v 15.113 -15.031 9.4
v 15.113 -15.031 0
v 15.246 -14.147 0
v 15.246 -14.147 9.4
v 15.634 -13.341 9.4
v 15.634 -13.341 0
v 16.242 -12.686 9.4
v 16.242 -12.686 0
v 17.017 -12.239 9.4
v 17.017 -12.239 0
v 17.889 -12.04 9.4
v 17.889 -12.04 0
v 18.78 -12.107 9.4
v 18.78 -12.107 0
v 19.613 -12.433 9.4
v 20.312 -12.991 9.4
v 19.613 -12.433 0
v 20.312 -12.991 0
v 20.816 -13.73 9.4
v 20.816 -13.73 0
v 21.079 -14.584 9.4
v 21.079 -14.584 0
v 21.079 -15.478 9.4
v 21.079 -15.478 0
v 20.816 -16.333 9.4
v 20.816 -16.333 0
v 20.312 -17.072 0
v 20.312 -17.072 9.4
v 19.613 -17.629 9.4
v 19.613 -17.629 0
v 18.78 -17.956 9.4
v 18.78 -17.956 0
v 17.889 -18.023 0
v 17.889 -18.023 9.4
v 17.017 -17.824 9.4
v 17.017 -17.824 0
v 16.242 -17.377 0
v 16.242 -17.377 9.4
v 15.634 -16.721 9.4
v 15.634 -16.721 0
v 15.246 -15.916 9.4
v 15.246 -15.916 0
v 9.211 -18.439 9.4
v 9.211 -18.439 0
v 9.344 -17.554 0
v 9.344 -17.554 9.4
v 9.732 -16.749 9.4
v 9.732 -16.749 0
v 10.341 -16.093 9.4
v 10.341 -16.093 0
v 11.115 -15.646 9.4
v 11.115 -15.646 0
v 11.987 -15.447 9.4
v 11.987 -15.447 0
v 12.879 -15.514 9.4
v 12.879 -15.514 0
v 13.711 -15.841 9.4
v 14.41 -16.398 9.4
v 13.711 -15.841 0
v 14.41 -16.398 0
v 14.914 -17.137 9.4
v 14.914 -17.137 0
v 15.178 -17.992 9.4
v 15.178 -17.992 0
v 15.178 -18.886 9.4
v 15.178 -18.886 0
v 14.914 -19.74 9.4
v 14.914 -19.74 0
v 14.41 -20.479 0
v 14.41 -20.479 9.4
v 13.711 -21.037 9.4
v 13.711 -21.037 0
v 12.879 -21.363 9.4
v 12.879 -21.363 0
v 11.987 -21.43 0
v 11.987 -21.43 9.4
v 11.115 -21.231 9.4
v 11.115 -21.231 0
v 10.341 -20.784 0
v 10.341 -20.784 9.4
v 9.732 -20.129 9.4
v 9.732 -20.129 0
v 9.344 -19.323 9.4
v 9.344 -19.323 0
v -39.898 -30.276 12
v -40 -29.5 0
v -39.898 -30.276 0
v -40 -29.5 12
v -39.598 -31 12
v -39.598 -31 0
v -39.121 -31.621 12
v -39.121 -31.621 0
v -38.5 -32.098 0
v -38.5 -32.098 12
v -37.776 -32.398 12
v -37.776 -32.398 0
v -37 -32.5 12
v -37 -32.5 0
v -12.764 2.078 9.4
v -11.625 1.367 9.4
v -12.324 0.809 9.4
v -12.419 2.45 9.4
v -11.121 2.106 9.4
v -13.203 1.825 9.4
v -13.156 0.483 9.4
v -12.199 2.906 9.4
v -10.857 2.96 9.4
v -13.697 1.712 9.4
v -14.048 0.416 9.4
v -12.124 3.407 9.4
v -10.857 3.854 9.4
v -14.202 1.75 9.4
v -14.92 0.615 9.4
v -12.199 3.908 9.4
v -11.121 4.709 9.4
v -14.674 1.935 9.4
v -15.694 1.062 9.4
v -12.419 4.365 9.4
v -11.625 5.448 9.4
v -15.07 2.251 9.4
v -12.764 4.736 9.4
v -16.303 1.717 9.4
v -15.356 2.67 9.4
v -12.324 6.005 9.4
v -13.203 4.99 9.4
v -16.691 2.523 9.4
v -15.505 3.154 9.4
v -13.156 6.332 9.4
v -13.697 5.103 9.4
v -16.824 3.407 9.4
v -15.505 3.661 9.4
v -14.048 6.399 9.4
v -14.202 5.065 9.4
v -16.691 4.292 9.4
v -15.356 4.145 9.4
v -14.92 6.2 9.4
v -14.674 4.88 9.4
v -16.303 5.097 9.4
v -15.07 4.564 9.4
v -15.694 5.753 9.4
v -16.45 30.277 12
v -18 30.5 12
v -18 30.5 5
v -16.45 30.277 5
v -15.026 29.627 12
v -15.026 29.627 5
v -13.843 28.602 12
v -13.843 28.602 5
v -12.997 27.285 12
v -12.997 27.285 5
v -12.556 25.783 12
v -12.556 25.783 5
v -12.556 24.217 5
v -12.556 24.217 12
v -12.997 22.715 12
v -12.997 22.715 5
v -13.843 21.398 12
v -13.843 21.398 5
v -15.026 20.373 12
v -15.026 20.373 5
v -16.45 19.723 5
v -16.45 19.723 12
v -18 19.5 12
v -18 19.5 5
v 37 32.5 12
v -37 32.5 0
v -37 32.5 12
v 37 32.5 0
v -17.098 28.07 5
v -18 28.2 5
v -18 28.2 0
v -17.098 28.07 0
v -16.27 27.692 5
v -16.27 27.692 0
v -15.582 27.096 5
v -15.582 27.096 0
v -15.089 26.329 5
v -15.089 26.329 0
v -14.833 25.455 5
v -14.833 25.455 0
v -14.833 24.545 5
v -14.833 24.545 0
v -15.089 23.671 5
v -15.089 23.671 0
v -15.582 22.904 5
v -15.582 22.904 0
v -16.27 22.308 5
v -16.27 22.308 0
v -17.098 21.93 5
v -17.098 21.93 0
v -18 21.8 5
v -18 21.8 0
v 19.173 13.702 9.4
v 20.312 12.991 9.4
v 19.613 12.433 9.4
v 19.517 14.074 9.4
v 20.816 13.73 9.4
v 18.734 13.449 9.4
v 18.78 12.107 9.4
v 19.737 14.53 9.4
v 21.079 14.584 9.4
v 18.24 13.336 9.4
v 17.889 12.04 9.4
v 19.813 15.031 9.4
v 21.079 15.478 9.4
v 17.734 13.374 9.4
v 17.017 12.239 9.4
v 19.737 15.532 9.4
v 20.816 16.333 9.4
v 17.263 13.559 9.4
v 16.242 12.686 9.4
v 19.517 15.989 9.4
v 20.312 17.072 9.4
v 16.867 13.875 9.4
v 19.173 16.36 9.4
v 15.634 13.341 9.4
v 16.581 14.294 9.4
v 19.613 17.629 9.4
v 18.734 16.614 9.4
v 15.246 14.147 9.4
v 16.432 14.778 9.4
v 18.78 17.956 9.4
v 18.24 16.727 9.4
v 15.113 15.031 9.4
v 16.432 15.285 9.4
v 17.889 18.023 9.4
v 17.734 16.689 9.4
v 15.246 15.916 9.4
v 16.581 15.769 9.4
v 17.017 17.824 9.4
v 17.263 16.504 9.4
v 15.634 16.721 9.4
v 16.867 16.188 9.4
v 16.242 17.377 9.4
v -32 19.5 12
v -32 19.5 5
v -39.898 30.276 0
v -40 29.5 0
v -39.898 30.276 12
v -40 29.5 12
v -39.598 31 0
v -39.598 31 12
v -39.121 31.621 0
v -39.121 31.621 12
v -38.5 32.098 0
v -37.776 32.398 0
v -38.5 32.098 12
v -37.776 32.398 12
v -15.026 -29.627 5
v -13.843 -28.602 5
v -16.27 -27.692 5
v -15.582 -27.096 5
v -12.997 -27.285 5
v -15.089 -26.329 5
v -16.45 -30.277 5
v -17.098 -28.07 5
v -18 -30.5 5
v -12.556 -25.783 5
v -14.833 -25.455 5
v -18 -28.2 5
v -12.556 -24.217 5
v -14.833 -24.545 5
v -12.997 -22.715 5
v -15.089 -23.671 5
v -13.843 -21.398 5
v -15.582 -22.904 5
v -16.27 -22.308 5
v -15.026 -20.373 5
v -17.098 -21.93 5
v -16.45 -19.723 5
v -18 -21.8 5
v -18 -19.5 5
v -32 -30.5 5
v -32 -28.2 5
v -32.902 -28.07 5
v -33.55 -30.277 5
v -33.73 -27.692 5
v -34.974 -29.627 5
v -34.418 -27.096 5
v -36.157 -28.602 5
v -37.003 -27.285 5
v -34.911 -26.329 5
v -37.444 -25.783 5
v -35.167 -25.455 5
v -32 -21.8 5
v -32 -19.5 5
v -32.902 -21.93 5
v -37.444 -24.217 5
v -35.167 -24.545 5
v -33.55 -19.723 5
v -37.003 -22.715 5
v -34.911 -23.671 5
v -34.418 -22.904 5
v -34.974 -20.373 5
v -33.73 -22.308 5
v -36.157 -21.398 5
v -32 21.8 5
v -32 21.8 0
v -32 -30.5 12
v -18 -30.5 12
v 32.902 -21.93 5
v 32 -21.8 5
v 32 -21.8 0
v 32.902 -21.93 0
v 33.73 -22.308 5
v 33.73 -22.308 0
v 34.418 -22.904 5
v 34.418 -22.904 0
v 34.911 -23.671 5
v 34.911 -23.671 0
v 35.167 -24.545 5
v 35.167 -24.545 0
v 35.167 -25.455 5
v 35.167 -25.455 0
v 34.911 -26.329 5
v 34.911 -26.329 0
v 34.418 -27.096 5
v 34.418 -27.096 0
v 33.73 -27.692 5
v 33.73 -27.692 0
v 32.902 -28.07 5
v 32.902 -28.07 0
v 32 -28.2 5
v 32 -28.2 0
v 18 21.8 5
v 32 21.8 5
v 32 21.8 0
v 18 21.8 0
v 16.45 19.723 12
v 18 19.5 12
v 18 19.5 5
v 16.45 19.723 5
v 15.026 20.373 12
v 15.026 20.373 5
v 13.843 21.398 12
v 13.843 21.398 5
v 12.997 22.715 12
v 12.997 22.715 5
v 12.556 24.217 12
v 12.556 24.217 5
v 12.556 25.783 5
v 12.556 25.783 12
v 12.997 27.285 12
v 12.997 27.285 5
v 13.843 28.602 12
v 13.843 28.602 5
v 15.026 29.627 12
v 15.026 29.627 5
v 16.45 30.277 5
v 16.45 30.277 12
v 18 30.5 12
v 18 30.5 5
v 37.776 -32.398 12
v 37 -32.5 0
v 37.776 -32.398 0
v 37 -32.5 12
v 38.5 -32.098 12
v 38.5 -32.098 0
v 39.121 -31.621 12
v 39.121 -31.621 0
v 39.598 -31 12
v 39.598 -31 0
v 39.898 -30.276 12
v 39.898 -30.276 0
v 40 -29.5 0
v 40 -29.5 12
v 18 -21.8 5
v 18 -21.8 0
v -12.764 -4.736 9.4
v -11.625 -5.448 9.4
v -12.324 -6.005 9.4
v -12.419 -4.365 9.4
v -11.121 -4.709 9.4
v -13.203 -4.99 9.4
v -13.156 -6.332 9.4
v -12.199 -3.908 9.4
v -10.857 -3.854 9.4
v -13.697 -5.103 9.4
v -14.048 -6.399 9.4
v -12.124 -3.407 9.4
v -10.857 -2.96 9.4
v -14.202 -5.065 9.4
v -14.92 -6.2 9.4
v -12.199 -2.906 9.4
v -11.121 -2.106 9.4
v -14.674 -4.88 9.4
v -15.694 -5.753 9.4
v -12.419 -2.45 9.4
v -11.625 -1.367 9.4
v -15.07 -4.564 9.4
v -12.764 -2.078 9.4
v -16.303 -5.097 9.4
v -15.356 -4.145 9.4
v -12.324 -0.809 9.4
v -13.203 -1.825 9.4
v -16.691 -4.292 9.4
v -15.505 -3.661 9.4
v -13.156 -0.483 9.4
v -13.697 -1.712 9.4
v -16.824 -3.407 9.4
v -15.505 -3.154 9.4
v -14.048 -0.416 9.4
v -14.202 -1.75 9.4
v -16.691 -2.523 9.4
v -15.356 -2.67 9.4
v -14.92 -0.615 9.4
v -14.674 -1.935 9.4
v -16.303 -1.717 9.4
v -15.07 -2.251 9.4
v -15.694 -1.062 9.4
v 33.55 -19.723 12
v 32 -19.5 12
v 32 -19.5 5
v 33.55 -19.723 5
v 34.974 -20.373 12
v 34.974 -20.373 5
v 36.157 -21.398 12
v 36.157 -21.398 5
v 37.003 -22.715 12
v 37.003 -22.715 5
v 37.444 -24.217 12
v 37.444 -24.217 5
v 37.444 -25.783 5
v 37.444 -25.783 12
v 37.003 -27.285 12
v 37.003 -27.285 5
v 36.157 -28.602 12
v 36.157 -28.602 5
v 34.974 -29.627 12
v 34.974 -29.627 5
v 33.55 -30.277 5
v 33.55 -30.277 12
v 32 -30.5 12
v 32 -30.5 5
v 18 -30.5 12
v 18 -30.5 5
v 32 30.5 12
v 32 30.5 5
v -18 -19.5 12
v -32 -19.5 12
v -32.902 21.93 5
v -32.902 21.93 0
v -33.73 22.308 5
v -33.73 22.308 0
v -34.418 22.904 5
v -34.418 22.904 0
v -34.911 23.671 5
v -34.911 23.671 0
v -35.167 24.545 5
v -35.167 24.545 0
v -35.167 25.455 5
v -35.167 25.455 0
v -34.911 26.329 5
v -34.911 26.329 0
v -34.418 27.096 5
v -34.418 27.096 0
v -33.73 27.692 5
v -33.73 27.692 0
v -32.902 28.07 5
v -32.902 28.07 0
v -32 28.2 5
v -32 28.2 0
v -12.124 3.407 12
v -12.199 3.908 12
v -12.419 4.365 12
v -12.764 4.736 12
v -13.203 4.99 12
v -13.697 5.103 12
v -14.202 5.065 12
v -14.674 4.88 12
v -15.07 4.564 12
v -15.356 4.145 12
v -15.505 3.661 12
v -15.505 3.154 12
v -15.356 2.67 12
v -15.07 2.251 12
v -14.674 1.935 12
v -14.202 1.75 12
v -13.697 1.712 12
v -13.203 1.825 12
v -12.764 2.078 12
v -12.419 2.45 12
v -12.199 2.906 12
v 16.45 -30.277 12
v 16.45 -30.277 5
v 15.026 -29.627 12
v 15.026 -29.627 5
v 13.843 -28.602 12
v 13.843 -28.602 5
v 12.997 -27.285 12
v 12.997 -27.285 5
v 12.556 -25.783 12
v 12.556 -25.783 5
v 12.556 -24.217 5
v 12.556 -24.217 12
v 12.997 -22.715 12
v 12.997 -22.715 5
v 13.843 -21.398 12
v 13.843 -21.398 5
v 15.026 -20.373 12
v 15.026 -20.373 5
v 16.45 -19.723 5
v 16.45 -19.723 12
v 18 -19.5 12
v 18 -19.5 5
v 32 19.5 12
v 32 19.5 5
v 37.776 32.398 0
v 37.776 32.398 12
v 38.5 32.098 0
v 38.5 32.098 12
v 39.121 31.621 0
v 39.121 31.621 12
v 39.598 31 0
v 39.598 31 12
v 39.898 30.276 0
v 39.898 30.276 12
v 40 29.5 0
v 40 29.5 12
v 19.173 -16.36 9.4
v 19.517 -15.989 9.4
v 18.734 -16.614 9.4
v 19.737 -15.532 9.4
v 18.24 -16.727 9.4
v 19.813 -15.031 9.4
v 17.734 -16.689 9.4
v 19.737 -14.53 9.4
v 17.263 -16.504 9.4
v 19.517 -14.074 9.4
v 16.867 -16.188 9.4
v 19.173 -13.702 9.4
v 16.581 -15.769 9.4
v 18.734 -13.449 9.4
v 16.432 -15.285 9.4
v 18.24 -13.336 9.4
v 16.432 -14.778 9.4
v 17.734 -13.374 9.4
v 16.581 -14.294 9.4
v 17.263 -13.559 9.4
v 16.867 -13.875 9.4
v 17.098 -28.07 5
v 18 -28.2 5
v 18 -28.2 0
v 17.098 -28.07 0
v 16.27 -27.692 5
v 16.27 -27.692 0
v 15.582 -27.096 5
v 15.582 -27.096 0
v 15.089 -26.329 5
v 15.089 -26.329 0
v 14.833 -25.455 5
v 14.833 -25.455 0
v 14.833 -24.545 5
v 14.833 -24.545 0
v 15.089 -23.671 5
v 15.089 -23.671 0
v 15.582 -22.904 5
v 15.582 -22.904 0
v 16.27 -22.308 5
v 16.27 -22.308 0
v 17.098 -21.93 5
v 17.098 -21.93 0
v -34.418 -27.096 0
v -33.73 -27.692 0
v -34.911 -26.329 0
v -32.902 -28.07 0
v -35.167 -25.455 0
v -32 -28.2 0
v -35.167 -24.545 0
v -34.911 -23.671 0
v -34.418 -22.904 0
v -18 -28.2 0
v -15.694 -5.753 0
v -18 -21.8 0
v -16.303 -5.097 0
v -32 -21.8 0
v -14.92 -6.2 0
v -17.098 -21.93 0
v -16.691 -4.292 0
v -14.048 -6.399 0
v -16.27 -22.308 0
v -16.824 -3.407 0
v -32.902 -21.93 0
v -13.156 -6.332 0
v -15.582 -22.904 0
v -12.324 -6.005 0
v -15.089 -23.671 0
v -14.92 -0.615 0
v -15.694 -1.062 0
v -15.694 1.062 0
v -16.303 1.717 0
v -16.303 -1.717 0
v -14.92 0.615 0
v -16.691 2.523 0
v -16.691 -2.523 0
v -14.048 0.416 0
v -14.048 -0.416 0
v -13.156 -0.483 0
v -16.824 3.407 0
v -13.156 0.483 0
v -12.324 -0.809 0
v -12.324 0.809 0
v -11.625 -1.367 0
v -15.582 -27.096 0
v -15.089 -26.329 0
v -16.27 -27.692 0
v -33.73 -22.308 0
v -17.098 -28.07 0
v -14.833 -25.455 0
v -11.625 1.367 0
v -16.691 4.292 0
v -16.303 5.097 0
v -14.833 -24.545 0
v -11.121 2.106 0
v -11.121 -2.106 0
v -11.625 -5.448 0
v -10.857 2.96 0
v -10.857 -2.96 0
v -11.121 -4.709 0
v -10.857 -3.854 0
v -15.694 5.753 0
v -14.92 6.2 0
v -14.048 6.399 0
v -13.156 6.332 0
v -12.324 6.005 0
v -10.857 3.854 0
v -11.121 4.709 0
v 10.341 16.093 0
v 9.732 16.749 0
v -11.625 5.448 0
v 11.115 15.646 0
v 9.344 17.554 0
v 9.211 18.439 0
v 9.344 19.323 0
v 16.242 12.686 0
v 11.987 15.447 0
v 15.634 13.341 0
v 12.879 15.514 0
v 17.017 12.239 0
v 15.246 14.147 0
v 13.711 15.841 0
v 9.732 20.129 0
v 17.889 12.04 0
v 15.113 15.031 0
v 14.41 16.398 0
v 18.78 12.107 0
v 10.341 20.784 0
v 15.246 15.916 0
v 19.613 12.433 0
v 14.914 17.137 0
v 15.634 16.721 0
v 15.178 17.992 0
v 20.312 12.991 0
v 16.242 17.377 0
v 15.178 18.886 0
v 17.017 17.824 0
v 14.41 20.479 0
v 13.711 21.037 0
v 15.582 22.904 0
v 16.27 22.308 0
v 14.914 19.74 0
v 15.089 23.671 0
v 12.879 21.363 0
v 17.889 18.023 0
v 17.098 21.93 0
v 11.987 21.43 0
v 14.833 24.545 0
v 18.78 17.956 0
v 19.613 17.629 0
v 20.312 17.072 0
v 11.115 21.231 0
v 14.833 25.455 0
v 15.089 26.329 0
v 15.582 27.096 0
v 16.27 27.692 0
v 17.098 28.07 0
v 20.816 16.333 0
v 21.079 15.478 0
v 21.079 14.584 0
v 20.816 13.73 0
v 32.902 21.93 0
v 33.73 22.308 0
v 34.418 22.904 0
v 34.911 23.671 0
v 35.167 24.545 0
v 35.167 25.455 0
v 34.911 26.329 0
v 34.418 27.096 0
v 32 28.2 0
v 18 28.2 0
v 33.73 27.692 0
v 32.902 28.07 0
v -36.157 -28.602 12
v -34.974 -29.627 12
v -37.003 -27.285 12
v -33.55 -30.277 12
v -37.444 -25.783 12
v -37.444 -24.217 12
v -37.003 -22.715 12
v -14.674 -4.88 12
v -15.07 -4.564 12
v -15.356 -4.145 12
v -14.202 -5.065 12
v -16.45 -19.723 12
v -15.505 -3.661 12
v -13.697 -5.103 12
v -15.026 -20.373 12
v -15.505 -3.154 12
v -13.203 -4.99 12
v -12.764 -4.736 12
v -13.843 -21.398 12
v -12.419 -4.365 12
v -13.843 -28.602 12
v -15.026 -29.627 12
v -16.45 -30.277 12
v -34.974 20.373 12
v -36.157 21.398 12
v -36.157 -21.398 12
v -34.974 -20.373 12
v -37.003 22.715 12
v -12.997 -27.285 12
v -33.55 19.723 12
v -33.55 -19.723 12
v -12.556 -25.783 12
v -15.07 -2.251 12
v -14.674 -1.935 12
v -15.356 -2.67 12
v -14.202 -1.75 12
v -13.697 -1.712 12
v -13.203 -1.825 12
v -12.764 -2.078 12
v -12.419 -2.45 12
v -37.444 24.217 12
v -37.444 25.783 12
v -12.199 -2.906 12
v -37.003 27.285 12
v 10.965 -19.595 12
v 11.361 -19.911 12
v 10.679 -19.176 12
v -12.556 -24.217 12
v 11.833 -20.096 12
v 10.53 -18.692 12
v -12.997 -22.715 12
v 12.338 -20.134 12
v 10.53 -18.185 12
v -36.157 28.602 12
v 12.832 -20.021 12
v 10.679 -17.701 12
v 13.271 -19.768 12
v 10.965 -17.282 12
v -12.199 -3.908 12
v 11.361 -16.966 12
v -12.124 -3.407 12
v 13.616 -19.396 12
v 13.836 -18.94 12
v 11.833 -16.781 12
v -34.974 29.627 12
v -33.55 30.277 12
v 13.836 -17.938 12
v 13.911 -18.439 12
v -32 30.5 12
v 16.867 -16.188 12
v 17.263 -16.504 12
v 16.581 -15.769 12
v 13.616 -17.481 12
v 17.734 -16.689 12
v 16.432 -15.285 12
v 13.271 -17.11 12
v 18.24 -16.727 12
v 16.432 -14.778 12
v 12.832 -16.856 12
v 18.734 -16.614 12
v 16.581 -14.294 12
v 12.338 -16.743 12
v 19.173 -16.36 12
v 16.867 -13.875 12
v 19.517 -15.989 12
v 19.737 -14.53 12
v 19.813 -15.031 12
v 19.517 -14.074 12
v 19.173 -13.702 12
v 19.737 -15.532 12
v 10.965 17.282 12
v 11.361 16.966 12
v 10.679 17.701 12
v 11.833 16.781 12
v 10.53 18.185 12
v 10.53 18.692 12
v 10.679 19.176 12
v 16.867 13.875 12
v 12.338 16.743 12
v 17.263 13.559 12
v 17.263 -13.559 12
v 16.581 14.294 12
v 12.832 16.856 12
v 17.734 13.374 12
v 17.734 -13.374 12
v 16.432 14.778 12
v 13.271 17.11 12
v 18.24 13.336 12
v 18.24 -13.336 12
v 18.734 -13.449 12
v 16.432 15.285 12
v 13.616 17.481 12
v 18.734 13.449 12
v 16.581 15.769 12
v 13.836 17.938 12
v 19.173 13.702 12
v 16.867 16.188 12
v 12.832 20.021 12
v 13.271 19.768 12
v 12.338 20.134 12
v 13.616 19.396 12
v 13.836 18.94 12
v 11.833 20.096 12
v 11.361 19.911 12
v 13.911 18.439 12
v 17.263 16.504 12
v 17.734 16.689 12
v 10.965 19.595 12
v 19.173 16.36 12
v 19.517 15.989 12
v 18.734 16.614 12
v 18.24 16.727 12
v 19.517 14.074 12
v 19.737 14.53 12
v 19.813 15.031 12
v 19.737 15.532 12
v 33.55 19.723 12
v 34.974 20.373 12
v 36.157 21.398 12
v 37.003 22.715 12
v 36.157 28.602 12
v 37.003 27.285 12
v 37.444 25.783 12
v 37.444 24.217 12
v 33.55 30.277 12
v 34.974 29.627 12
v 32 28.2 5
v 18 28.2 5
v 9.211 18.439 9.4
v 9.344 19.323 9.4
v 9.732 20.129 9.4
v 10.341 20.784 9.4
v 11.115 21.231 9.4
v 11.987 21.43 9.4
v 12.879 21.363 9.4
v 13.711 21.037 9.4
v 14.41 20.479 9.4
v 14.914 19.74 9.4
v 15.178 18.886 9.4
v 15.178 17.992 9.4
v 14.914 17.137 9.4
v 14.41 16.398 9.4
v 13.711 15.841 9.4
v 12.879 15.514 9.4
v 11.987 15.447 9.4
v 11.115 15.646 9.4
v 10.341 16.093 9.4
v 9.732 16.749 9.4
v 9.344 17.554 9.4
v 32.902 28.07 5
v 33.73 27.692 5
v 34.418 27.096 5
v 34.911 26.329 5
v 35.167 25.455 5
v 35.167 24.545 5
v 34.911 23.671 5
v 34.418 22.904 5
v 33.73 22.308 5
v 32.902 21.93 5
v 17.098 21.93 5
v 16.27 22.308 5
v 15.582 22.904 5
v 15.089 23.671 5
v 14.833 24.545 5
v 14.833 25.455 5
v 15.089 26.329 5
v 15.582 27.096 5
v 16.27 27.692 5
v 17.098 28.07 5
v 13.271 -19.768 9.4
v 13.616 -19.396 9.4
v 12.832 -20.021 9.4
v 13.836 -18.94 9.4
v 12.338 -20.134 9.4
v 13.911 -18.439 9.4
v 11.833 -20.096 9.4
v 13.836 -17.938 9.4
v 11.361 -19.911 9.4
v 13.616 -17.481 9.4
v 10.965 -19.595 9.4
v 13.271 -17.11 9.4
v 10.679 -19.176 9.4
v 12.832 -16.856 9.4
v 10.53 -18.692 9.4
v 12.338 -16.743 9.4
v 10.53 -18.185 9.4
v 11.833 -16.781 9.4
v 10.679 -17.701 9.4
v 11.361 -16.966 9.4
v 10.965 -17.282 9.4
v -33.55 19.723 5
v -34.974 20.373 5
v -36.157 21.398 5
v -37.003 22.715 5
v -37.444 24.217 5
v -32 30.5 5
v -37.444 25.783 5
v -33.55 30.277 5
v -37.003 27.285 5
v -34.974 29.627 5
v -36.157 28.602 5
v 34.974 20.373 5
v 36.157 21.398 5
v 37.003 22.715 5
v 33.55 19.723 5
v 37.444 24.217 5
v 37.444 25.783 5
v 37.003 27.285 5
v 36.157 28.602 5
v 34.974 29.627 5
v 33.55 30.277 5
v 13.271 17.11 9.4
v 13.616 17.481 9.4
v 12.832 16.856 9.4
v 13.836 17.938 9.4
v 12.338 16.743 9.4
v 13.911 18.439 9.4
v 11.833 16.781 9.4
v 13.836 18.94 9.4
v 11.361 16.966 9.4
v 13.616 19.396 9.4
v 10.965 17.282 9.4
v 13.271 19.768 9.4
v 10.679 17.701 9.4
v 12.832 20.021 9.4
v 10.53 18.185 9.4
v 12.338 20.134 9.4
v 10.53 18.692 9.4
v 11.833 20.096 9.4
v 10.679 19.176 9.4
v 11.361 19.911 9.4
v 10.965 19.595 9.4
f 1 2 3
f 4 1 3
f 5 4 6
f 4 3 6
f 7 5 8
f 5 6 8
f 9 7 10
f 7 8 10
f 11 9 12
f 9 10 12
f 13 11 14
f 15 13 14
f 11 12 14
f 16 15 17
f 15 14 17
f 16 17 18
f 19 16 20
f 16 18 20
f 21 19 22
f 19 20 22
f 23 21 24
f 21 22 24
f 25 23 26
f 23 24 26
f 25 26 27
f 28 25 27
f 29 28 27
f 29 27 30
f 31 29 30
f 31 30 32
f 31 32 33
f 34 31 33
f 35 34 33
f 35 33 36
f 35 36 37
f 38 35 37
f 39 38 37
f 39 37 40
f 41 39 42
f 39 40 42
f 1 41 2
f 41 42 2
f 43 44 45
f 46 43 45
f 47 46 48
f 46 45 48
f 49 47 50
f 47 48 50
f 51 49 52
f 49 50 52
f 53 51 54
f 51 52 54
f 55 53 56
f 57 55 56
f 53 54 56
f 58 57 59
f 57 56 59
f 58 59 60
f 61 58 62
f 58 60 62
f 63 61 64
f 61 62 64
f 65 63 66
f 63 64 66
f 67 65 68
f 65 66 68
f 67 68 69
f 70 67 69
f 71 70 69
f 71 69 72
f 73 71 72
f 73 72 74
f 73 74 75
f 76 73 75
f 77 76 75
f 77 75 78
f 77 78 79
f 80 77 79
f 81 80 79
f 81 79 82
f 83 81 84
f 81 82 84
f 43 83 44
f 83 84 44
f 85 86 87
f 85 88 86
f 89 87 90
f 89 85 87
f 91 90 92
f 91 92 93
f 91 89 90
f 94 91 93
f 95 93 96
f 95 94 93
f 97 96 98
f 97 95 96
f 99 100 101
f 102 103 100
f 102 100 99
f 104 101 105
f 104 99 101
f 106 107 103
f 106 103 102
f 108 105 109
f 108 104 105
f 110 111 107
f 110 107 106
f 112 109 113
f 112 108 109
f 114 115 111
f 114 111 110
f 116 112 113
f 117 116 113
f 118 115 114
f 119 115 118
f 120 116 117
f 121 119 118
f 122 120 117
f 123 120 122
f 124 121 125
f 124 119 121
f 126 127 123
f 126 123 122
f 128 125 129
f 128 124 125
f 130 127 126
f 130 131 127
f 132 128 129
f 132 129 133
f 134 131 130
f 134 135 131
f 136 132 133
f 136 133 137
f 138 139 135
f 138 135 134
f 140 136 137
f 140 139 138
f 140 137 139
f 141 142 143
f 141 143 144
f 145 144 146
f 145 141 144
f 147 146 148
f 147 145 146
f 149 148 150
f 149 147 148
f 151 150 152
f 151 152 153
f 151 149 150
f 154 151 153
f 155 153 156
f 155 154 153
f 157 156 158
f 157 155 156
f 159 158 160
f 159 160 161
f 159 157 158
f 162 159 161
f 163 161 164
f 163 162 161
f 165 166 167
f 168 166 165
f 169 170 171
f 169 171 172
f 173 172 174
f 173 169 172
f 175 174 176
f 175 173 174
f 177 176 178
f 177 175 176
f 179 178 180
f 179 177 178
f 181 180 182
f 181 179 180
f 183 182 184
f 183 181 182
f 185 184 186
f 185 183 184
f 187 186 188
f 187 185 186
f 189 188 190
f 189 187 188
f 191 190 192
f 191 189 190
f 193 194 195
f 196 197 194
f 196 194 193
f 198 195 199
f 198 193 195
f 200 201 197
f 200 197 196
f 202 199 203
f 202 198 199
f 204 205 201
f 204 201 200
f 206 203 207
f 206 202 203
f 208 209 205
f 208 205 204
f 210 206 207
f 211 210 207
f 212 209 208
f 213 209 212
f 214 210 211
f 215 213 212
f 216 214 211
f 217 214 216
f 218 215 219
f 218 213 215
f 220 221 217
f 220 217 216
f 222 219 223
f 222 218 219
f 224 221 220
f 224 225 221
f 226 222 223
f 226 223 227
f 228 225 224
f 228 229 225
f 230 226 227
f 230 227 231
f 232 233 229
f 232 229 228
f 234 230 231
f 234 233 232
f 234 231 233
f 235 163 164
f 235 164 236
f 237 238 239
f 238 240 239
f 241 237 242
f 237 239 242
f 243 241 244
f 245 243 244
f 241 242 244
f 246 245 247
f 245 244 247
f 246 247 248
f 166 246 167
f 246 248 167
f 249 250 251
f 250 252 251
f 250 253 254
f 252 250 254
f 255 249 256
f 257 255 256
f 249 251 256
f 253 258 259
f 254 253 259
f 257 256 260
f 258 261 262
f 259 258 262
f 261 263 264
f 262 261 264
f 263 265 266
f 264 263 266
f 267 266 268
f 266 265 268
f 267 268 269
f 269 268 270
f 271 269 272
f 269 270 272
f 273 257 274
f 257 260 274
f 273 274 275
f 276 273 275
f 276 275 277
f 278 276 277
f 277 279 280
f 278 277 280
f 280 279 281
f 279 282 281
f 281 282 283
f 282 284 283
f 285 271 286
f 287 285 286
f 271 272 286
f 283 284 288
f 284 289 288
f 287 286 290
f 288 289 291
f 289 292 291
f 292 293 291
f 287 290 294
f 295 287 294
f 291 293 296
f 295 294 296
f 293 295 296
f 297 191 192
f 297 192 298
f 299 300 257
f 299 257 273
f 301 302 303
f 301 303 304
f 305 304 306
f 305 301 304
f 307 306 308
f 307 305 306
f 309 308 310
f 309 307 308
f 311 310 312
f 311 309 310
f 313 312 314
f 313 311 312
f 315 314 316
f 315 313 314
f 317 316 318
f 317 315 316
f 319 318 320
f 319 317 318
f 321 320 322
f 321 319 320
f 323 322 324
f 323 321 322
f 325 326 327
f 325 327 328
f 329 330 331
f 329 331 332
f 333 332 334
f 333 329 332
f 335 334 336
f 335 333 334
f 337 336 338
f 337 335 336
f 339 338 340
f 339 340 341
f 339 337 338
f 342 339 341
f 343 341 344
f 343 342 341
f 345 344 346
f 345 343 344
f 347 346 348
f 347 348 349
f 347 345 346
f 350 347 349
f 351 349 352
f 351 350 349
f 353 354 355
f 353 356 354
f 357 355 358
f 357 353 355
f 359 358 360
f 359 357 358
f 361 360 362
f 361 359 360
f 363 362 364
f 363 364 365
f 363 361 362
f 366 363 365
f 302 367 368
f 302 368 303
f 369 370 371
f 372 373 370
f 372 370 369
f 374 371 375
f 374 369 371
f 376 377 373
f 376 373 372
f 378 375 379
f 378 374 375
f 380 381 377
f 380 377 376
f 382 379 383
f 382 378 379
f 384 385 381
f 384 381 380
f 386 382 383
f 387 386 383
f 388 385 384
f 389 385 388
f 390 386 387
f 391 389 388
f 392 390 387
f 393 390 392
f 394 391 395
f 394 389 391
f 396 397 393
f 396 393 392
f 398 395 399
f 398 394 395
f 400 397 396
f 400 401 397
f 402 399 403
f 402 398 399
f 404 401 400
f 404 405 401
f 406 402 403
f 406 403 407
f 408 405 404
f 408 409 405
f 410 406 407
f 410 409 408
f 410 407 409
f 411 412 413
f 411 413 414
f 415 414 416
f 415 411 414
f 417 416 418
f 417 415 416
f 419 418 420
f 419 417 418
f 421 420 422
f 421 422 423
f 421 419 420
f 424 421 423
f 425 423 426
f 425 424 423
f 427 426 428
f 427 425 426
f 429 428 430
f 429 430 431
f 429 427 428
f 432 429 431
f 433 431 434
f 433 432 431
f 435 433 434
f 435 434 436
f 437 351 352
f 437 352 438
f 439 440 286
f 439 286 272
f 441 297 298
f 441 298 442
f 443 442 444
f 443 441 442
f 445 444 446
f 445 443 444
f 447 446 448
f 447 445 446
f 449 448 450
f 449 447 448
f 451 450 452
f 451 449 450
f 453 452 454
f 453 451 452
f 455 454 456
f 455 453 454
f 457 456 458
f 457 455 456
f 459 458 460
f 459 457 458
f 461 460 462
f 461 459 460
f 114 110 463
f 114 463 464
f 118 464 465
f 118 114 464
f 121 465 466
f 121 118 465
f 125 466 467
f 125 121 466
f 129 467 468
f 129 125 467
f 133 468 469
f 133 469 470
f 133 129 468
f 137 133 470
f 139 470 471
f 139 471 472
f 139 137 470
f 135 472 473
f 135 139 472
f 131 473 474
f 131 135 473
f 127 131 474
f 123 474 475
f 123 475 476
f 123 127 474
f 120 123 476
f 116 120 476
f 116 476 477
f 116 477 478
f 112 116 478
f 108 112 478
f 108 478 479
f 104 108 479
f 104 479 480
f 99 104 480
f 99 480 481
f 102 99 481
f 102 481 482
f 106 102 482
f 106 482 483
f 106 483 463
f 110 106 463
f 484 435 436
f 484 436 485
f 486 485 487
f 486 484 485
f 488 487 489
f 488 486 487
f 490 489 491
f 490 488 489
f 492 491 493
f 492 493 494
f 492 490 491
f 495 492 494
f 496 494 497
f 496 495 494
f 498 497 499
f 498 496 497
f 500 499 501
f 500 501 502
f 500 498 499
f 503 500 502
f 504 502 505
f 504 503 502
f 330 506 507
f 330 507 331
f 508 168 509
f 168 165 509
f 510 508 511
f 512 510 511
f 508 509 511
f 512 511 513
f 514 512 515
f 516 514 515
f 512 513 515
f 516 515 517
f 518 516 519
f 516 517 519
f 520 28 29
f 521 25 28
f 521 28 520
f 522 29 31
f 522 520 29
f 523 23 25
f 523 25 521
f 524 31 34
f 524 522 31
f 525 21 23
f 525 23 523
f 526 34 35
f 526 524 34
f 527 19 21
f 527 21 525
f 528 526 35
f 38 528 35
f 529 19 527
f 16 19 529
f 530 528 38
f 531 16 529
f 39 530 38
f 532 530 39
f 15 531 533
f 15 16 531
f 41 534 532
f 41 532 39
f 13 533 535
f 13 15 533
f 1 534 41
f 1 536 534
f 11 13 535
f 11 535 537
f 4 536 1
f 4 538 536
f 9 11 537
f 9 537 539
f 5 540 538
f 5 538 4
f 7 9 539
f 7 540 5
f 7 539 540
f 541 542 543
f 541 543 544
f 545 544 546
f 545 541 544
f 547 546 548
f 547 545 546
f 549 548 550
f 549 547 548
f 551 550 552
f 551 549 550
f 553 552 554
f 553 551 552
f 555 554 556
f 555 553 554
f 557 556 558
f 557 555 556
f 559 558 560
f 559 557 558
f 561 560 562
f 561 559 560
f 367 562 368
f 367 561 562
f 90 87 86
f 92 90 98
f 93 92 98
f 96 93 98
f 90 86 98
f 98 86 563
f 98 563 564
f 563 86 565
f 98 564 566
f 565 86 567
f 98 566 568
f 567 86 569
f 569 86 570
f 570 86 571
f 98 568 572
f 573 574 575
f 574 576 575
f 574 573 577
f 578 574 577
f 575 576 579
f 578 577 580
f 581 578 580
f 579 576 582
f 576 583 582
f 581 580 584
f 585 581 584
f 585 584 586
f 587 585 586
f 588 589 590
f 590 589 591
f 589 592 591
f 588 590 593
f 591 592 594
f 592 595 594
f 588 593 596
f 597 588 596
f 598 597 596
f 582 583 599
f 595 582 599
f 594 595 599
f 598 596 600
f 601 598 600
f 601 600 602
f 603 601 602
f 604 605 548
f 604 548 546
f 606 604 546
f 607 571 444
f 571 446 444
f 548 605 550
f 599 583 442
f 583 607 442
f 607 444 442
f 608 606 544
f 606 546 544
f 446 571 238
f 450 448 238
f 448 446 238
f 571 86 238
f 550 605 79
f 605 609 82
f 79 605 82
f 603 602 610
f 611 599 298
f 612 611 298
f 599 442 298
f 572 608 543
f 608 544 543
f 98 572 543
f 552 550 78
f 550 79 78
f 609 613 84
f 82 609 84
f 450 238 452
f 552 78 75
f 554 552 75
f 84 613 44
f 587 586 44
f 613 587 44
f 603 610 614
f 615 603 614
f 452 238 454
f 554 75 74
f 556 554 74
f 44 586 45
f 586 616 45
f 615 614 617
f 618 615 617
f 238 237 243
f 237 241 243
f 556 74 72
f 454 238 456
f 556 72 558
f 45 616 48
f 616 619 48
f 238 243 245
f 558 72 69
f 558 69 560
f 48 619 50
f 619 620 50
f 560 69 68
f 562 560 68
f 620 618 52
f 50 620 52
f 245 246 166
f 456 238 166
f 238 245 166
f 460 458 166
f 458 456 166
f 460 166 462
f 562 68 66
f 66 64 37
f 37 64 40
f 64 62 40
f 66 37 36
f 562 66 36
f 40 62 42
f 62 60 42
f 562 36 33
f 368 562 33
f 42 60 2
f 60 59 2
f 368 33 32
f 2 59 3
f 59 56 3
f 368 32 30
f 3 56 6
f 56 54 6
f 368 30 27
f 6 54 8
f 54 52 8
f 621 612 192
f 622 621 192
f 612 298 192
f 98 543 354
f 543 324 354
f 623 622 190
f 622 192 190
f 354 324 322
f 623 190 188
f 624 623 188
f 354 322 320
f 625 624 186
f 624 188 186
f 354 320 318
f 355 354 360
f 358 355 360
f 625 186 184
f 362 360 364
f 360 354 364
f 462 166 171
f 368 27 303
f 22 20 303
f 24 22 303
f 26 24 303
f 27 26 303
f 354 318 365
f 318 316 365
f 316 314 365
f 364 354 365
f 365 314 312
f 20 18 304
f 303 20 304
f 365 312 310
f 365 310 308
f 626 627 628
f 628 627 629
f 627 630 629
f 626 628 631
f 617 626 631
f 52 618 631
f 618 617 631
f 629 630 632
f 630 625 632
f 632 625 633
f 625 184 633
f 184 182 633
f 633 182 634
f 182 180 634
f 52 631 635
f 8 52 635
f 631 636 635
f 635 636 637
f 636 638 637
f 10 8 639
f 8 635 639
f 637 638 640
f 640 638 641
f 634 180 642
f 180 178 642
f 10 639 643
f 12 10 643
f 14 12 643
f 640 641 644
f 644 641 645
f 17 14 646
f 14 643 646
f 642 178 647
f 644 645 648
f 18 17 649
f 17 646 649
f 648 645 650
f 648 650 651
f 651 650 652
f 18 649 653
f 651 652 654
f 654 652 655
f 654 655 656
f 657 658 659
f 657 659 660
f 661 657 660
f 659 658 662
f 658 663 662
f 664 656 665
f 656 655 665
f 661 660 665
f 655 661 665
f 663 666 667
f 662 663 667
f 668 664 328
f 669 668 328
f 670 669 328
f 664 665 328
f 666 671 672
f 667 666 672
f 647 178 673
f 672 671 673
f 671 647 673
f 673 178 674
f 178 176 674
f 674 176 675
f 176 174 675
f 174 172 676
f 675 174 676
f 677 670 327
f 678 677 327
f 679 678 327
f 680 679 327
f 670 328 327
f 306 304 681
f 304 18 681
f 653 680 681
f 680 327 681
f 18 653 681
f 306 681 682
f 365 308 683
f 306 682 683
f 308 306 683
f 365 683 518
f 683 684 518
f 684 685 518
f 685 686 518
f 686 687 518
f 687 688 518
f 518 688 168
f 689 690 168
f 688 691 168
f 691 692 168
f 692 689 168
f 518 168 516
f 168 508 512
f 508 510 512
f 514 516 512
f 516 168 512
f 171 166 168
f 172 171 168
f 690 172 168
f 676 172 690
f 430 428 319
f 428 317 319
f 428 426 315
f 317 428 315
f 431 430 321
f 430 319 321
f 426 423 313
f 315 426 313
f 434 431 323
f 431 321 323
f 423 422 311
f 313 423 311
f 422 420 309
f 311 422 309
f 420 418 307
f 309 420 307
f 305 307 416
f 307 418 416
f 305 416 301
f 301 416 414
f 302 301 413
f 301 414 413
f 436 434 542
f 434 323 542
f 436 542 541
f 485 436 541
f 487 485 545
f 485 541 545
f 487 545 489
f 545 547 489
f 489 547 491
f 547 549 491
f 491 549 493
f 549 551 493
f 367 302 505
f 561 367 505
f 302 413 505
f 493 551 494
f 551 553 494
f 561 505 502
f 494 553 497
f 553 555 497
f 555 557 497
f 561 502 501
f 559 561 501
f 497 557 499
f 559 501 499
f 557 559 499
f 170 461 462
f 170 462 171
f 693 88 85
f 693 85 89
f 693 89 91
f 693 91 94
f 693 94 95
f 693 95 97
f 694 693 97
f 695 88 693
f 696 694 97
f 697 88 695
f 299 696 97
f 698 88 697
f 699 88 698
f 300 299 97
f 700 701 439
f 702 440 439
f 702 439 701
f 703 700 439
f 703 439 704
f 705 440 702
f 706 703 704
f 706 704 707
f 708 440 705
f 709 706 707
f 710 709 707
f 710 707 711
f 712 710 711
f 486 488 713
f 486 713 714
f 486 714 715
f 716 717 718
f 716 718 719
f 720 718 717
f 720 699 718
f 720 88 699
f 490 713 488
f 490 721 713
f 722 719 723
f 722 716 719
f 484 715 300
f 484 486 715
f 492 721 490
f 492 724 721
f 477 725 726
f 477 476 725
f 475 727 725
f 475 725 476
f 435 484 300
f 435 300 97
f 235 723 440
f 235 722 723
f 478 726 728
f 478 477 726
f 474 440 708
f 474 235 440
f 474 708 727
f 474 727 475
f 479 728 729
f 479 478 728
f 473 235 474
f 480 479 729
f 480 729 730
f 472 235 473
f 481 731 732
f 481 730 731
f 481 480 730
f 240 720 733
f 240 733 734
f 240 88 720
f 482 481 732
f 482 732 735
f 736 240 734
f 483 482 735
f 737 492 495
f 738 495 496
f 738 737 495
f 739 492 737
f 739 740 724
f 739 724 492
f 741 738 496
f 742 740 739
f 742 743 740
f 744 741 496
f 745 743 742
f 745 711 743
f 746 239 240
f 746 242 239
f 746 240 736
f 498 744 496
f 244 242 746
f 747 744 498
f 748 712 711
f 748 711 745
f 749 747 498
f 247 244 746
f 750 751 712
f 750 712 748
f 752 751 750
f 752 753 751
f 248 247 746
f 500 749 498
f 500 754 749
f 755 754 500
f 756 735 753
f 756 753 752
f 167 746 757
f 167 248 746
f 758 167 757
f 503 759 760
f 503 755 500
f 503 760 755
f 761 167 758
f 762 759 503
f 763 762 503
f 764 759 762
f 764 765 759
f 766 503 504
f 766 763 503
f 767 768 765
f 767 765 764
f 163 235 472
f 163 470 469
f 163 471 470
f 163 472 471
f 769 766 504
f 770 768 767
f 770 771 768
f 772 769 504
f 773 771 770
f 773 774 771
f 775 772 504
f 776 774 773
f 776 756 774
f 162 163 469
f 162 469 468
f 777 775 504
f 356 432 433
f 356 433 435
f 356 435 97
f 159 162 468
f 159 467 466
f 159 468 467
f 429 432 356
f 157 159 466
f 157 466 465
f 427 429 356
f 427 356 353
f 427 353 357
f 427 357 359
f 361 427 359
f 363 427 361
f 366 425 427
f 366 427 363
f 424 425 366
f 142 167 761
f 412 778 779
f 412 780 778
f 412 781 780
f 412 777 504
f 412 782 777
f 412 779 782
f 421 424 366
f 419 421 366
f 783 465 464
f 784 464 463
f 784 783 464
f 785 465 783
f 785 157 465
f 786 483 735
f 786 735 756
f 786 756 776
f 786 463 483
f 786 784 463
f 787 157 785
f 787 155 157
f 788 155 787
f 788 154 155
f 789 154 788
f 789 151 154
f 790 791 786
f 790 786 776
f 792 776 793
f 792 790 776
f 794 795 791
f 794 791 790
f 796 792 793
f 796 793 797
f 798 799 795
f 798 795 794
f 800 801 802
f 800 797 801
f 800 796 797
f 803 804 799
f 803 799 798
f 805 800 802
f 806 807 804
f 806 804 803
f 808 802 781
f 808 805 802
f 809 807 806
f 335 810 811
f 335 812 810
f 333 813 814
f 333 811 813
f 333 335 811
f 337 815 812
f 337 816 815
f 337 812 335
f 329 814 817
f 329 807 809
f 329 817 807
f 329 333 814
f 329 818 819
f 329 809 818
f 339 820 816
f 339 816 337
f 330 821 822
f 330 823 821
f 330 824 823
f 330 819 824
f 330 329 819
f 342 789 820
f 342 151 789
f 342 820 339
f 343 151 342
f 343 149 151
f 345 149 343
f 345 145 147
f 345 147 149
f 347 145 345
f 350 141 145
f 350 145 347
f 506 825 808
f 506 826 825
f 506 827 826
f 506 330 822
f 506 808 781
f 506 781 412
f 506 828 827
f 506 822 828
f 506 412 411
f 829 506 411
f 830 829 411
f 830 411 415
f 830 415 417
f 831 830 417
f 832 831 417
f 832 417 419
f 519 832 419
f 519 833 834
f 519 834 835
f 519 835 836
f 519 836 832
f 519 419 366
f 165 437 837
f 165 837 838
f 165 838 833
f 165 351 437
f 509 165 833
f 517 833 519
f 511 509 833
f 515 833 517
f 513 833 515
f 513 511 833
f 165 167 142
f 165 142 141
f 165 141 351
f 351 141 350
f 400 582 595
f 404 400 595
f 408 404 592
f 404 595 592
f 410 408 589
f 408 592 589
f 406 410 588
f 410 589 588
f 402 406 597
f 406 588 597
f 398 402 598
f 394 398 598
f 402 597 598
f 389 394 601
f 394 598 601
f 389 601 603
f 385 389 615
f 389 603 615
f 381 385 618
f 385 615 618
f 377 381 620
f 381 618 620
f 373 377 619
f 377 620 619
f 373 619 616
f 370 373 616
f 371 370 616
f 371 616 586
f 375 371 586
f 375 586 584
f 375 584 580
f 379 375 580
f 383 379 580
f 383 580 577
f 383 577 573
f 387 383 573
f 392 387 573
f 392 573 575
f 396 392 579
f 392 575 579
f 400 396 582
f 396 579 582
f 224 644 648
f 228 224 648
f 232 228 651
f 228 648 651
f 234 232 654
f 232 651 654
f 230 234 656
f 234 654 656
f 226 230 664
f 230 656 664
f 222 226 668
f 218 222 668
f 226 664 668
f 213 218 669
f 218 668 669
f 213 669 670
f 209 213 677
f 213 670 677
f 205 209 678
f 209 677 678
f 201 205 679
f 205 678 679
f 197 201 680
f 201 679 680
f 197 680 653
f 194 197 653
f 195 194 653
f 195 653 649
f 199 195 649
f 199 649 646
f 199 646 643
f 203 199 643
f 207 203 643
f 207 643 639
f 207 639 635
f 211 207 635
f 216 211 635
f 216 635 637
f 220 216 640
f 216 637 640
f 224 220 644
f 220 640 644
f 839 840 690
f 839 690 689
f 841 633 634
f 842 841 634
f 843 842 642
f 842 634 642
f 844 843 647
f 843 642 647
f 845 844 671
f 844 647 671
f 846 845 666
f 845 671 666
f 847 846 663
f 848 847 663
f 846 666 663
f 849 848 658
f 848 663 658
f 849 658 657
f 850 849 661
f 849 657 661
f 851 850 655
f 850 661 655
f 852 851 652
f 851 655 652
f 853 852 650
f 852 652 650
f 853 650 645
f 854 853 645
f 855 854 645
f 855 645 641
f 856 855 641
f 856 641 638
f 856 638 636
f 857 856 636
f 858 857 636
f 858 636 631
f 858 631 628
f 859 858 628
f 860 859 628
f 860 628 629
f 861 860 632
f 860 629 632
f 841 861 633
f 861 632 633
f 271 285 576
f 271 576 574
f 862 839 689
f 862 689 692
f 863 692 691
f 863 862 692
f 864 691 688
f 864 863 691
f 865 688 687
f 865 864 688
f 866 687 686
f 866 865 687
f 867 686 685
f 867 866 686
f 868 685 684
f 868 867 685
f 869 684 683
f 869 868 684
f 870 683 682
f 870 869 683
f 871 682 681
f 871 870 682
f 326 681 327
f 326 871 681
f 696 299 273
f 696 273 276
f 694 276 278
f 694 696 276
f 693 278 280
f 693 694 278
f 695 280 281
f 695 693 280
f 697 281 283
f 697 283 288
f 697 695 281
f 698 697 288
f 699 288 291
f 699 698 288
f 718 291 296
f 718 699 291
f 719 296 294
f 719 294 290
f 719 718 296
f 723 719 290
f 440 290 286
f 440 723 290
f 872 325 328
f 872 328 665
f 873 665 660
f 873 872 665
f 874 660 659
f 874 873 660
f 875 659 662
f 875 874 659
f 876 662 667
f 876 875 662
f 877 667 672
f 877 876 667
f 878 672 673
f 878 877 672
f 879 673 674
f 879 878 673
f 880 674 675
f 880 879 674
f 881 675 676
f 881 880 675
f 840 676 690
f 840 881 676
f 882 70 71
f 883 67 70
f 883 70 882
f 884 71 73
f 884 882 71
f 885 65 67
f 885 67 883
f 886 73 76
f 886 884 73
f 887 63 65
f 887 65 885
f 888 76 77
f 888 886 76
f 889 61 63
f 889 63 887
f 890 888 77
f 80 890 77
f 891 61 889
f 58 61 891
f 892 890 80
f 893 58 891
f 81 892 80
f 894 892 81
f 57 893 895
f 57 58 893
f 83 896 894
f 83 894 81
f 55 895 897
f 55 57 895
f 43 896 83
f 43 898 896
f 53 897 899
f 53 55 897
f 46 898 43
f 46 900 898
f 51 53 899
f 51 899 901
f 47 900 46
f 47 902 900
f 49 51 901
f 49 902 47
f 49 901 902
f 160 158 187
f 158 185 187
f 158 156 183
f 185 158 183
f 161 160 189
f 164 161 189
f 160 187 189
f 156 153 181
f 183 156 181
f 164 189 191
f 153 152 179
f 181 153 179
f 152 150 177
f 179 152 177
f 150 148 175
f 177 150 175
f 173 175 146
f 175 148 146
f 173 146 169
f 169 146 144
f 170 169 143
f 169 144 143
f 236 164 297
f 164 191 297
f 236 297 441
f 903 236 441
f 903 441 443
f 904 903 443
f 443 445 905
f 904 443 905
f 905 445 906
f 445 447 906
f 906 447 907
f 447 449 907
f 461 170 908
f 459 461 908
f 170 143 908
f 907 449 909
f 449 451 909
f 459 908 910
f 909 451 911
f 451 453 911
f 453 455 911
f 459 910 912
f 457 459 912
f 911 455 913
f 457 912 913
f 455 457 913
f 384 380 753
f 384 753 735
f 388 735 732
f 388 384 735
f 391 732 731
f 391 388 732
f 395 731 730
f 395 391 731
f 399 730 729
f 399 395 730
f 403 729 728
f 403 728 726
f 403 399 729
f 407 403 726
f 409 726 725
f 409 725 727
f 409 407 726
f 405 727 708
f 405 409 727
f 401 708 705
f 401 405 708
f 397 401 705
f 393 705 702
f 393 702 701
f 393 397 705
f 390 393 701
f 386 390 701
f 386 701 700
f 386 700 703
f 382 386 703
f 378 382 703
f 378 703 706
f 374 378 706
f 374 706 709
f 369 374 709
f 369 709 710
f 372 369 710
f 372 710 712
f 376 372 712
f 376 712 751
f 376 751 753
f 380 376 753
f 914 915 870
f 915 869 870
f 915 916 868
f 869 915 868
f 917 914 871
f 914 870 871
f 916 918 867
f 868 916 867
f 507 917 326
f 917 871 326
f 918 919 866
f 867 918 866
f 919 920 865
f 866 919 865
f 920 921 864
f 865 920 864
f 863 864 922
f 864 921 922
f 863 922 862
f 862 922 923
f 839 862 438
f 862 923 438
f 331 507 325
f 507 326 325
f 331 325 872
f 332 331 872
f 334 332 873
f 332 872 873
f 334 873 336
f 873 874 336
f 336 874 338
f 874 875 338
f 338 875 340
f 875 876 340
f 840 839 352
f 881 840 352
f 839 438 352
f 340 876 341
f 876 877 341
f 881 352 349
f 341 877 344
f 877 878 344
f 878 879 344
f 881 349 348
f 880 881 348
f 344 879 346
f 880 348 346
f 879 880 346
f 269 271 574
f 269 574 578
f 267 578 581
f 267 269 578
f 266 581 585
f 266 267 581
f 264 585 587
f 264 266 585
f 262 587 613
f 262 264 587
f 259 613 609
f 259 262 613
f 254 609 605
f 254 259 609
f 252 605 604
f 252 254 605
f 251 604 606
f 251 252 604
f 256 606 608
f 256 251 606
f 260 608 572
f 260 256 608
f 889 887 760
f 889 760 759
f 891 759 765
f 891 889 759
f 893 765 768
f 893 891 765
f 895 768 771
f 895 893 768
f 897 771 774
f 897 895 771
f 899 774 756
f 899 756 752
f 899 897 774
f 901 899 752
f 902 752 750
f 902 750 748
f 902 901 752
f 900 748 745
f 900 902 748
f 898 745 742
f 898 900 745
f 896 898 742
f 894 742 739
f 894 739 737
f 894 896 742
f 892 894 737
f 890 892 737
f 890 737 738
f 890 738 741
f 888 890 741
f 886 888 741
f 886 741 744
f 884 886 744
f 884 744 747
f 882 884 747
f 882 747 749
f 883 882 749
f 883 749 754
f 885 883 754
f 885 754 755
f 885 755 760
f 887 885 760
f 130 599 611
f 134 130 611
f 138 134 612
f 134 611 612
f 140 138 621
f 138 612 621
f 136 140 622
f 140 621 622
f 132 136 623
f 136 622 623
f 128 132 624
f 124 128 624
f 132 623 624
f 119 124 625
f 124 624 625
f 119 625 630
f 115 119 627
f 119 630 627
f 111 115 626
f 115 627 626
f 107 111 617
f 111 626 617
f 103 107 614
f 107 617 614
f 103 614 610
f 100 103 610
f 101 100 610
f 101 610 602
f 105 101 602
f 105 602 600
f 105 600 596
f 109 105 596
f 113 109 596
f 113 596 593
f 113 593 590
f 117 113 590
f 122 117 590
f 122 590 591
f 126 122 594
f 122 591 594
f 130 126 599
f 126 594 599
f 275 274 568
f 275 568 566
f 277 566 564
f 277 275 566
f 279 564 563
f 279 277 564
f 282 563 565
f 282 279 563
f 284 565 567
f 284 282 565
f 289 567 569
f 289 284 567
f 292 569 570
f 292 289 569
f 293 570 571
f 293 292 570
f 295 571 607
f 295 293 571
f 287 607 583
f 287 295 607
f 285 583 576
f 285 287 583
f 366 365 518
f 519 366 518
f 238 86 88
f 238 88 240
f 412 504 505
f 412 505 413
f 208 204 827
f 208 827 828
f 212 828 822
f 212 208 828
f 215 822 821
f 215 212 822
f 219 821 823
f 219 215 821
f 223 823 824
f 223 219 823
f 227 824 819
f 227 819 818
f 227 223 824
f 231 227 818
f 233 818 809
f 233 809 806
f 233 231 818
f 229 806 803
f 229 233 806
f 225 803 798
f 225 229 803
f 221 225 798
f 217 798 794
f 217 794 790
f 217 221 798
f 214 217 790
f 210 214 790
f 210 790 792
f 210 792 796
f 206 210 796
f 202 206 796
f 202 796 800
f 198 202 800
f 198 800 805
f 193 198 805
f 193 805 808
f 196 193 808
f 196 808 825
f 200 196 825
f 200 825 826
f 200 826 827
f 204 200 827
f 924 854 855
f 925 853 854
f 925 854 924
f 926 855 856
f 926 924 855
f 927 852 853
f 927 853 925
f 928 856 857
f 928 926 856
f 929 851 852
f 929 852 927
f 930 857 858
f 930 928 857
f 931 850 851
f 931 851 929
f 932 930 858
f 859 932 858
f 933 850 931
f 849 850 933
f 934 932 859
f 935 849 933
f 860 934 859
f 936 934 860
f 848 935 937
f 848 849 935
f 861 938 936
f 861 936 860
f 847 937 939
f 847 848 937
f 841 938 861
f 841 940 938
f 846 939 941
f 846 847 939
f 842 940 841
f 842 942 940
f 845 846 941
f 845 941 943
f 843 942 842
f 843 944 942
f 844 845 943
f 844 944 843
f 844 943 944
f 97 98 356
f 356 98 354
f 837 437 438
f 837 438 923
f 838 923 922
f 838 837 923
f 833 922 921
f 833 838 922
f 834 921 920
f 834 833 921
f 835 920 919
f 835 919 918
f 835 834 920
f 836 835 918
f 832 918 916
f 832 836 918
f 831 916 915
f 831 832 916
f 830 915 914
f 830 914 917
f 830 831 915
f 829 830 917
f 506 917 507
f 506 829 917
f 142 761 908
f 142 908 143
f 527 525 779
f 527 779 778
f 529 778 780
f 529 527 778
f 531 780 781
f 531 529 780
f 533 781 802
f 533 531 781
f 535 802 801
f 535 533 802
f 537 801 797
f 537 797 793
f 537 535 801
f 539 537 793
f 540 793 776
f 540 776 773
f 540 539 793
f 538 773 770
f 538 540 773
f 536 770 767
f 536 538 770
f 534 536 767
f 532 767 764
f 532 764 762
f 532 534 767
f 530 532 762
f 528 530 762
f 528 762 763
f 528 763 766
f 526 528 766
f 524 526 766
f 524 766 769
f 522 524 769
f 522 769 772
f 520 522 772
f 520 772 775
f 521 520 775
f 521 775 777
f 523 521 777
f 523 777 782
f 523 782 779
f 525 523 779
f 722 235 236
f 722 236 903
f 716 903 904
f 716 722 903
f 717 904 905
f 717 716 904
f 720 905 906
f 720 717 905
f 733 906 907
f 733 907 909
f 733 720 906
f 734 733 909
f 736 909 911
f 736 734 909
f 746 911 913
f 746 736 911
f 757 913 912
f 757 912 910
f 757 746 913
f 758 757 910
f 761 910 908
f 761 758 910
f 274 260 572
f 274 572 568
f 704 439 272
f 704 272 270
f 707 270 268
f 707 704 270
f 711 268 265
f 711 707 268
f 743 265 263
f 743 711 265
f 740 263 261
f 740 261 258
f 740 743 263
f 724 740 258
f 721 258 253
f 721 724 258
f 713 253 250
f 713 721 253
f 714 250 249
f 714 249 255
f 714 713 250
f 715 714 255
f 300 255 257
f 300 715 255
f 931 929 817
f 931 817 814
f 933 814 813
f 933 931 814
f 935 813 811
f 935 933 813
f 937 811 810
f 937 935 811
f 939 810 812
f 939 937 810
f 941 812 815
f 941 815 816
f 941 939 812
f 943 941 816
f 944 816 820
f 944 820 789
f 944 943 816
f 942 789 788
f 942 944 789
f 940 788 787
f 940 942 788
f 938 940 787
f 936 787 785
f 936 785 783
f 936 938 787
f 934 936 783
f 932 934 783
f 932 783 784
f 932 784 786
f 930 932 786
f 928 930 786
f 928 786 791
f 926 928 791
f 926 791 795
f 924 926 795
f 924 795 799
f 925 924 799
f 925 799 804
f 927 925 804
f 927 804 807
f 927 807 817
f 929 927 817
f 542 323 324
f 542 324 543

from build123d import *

# Parameters (mm, degrees)
SKETCH_1_W          = 80
SKETCH_1_H          = 65
SKETCH_1_R          = 1.7
SKETCH_1_R_2        = 3.2
EXTRUDE_1_DEPTH     = 12
SKETCH_2_R          = 3
CUT_EXTRUDE_1_DEPTH = 9.4
FILLET_1_R          = 3
CUT_EXTRUDE_2_DEPTH = 7
CUT_EXTRUDE_3_DEPTH = 53.012017842


with BuildPart() as part:
    # 스케치1 → 보스-돌출1 (new body)
    with BuildSketch(Plane.XY):
        Rectangle(SKETCH_1_W, SKETCH_1_H)
        with Locations((-13.82389773, -3.407324542)):
            Circle(SKETCH_1_R, mode=Mode.SUBTRACT)
        with Locations((-13.82389773, 3.407324542)):
            Circle(SKETCH_1_R, mode=Mode.SUBTRACT)
        with Locations((18.112778477, 15.031324063)):
            Circle(SKETCH_1_R, mode=Mode.SUBTRACT)
        with Locations((12.211119252, 18.438648605)):
            Circle(SKETCH_1_R, mode=Mode.SUBTRACT)
        with Locations((12.211119252, -18.438648605)):
            Circle(SKETCH_1_R, mode=Mode.SUBTRACT)
        with Locations((18.112778477, -15.031324063)):
            Circle(SKETCH_1_R, mode=Mode.SUBTRACT)
        with Locations((25, -25)):
            Circle(SKETCH_1_R_2, mode=Mode.SUBTRACT)
        with Locations((25, 25)):
            Circle(SKETCH_1_R_2, mode=Mode.SUBTRACT)
        with Locations((-25, 25)):
            Circle(SKETCH_1_R_2, mode=Mode.SUBTRACT)
        with Locations((-25, -25)):
            Circle(SKETCH_1_R_2, mode=Mode.SUBTRACT)
    extrude(amount=EXTRUDE_1_DEPTH)

    # 스케치2 → 컷-돌출1 (cut)
    with BuildSketch(Plane(origin=(0, 0, 0), x_dir=(-1, 0, 0), z_dir=(0, 0, -1))):
        with Locations((-12.211119252, 18.438648605)):
            Circle(SKETCH_2_R)
        with Locations((-18.112778477, 15.031324063)):
            Circle(SKETCH_2_R)
        with Locations((-12.211119252, -18.438648605)):
            Circle(SKETCH_2_R)
        with Locations((-18.112778477, -15.031324063)):
            Circle(SKETCH_2_R)
        with Locations((13.82389773, -3.407324542)):
            Circle(SKETCH_2_R)
        with Locations((13.82389773, 3.407324542)):
            Circle(SKETCH_2_R)
    extrude(amount=-CUT_EXTRUDE_1_DEPTH, mode=Mode.SUBTRACT)

    # 필렛1
    fillet_1_edges = [part.edges().sort_by_distance(p)[0] for p in [
        (40, 32.5, 6),
        (40, -32.5, 6),
        (-40, -32.5, 6),
        (-40, 32.5, 6),
    ]]
    fillet(fillet_1_edges, radius=FILLET_1_R)

    # 스케치3 → 컷-돌출2 (cut)
    with BuildSketch(Plane.XY.offset(12)):
        with BuildLine():
            Line((-32, 30.5), (-18, 30.5))
            ThreePointArc((-18, 30.5), (-12.5, 25), (-18, 19.5))
            Line((-18, 19.5), (-32, 19.5))
            ThreePointArc((-32, 19.5), (-37.5, 25), (-32, 30.5))
        make_face()
        with BuildLine():
            Line((32, 19.5), (18, 19.5))
            ThreePointArc((18, 19.5), (12.5, 25), (18, 30.5))
            Line((18, 30.5), (32, 30.5))
            ThreePointArc((32, 30.5), (37.5, 25), (32, 19.5))
        make_face()
        with BuildLine():
            Line((32, -30.5), (18, -30.5))
            ThreePointArc((18, -30.5), (12.5, -25), (18, -19.5))
            Line((18, -19.5), (32, -19.5))
            ThreePointArc((32, -19.5), (37.5, -25), (32, -30.5))
        make_face()
        with BuildLine():
            Line((-32, -19.5), (-18, -19.5))
            ThreePointArc((-18, -19.5), (-12.5, -25), (-18, -30.5))
            Line((-18, -30.5), (-32, -30.5))
            ThreePointArc((-32, -30.5), (-37.5, -25), (-32, -19.5))
        make_face()
    extrude(amount=-CUT_EXTRUDE_2_DEPTH, mode=Mode.SUBTRACT)

    # 스케치4 → 컷-돌출3 (cut, through all)
    with BuildSketch(Plane.XY.offset(5)):
        with BuildLine():
            Line((-32, 28.2), (-18, 28.2))
            ThreePointArc((-18, 28.2), (-14.8, 25), (-18, 21.8))
            Line((-18, 21.8), (-32, 21.8))
            ThreePointArc((-32, 21.8), (-35.2, 25), (-32, 28.2))
        make_face()
        with BuildLine():
            Line((18, 28.2), (32, 28.2))
            ThreePointArc((32, 28.2), (35.2, 25), (32, 21.8))
            Line((32, 21.8), (18, 21.8))
            ThreePointArc((18, 21.8), (14.8, 25), (18, 28.2))
        make_face()
        with BuildLine():
            Line((32, -28.2), (18, -28.2))
            ThreePointArc((18, -28.2), (14.8, -25), (18, -21.8))
            Line((18, -21.8), (32, -21.8))
            ThreePointArc((32, -21.8), (35.2, -25), (32, -28.2))
        make_face()
        with BuildLine():
            Line((-32, -21.8), (-18, -21.8))
            ThreePointArc((-18, -21.8), (-14.8, -25), (-18, -28.2))
            Line((-18, -28.2), (-32, -28.2))
            ThreePointArc((-32, -28.2), (-35.2, -25), (-32, -21.8))
        make_face()
    extrude(amount=-CUT_EXTRUDE_3_DEPTH, mode=Mode.SUBTRACT)


solid = part.part
